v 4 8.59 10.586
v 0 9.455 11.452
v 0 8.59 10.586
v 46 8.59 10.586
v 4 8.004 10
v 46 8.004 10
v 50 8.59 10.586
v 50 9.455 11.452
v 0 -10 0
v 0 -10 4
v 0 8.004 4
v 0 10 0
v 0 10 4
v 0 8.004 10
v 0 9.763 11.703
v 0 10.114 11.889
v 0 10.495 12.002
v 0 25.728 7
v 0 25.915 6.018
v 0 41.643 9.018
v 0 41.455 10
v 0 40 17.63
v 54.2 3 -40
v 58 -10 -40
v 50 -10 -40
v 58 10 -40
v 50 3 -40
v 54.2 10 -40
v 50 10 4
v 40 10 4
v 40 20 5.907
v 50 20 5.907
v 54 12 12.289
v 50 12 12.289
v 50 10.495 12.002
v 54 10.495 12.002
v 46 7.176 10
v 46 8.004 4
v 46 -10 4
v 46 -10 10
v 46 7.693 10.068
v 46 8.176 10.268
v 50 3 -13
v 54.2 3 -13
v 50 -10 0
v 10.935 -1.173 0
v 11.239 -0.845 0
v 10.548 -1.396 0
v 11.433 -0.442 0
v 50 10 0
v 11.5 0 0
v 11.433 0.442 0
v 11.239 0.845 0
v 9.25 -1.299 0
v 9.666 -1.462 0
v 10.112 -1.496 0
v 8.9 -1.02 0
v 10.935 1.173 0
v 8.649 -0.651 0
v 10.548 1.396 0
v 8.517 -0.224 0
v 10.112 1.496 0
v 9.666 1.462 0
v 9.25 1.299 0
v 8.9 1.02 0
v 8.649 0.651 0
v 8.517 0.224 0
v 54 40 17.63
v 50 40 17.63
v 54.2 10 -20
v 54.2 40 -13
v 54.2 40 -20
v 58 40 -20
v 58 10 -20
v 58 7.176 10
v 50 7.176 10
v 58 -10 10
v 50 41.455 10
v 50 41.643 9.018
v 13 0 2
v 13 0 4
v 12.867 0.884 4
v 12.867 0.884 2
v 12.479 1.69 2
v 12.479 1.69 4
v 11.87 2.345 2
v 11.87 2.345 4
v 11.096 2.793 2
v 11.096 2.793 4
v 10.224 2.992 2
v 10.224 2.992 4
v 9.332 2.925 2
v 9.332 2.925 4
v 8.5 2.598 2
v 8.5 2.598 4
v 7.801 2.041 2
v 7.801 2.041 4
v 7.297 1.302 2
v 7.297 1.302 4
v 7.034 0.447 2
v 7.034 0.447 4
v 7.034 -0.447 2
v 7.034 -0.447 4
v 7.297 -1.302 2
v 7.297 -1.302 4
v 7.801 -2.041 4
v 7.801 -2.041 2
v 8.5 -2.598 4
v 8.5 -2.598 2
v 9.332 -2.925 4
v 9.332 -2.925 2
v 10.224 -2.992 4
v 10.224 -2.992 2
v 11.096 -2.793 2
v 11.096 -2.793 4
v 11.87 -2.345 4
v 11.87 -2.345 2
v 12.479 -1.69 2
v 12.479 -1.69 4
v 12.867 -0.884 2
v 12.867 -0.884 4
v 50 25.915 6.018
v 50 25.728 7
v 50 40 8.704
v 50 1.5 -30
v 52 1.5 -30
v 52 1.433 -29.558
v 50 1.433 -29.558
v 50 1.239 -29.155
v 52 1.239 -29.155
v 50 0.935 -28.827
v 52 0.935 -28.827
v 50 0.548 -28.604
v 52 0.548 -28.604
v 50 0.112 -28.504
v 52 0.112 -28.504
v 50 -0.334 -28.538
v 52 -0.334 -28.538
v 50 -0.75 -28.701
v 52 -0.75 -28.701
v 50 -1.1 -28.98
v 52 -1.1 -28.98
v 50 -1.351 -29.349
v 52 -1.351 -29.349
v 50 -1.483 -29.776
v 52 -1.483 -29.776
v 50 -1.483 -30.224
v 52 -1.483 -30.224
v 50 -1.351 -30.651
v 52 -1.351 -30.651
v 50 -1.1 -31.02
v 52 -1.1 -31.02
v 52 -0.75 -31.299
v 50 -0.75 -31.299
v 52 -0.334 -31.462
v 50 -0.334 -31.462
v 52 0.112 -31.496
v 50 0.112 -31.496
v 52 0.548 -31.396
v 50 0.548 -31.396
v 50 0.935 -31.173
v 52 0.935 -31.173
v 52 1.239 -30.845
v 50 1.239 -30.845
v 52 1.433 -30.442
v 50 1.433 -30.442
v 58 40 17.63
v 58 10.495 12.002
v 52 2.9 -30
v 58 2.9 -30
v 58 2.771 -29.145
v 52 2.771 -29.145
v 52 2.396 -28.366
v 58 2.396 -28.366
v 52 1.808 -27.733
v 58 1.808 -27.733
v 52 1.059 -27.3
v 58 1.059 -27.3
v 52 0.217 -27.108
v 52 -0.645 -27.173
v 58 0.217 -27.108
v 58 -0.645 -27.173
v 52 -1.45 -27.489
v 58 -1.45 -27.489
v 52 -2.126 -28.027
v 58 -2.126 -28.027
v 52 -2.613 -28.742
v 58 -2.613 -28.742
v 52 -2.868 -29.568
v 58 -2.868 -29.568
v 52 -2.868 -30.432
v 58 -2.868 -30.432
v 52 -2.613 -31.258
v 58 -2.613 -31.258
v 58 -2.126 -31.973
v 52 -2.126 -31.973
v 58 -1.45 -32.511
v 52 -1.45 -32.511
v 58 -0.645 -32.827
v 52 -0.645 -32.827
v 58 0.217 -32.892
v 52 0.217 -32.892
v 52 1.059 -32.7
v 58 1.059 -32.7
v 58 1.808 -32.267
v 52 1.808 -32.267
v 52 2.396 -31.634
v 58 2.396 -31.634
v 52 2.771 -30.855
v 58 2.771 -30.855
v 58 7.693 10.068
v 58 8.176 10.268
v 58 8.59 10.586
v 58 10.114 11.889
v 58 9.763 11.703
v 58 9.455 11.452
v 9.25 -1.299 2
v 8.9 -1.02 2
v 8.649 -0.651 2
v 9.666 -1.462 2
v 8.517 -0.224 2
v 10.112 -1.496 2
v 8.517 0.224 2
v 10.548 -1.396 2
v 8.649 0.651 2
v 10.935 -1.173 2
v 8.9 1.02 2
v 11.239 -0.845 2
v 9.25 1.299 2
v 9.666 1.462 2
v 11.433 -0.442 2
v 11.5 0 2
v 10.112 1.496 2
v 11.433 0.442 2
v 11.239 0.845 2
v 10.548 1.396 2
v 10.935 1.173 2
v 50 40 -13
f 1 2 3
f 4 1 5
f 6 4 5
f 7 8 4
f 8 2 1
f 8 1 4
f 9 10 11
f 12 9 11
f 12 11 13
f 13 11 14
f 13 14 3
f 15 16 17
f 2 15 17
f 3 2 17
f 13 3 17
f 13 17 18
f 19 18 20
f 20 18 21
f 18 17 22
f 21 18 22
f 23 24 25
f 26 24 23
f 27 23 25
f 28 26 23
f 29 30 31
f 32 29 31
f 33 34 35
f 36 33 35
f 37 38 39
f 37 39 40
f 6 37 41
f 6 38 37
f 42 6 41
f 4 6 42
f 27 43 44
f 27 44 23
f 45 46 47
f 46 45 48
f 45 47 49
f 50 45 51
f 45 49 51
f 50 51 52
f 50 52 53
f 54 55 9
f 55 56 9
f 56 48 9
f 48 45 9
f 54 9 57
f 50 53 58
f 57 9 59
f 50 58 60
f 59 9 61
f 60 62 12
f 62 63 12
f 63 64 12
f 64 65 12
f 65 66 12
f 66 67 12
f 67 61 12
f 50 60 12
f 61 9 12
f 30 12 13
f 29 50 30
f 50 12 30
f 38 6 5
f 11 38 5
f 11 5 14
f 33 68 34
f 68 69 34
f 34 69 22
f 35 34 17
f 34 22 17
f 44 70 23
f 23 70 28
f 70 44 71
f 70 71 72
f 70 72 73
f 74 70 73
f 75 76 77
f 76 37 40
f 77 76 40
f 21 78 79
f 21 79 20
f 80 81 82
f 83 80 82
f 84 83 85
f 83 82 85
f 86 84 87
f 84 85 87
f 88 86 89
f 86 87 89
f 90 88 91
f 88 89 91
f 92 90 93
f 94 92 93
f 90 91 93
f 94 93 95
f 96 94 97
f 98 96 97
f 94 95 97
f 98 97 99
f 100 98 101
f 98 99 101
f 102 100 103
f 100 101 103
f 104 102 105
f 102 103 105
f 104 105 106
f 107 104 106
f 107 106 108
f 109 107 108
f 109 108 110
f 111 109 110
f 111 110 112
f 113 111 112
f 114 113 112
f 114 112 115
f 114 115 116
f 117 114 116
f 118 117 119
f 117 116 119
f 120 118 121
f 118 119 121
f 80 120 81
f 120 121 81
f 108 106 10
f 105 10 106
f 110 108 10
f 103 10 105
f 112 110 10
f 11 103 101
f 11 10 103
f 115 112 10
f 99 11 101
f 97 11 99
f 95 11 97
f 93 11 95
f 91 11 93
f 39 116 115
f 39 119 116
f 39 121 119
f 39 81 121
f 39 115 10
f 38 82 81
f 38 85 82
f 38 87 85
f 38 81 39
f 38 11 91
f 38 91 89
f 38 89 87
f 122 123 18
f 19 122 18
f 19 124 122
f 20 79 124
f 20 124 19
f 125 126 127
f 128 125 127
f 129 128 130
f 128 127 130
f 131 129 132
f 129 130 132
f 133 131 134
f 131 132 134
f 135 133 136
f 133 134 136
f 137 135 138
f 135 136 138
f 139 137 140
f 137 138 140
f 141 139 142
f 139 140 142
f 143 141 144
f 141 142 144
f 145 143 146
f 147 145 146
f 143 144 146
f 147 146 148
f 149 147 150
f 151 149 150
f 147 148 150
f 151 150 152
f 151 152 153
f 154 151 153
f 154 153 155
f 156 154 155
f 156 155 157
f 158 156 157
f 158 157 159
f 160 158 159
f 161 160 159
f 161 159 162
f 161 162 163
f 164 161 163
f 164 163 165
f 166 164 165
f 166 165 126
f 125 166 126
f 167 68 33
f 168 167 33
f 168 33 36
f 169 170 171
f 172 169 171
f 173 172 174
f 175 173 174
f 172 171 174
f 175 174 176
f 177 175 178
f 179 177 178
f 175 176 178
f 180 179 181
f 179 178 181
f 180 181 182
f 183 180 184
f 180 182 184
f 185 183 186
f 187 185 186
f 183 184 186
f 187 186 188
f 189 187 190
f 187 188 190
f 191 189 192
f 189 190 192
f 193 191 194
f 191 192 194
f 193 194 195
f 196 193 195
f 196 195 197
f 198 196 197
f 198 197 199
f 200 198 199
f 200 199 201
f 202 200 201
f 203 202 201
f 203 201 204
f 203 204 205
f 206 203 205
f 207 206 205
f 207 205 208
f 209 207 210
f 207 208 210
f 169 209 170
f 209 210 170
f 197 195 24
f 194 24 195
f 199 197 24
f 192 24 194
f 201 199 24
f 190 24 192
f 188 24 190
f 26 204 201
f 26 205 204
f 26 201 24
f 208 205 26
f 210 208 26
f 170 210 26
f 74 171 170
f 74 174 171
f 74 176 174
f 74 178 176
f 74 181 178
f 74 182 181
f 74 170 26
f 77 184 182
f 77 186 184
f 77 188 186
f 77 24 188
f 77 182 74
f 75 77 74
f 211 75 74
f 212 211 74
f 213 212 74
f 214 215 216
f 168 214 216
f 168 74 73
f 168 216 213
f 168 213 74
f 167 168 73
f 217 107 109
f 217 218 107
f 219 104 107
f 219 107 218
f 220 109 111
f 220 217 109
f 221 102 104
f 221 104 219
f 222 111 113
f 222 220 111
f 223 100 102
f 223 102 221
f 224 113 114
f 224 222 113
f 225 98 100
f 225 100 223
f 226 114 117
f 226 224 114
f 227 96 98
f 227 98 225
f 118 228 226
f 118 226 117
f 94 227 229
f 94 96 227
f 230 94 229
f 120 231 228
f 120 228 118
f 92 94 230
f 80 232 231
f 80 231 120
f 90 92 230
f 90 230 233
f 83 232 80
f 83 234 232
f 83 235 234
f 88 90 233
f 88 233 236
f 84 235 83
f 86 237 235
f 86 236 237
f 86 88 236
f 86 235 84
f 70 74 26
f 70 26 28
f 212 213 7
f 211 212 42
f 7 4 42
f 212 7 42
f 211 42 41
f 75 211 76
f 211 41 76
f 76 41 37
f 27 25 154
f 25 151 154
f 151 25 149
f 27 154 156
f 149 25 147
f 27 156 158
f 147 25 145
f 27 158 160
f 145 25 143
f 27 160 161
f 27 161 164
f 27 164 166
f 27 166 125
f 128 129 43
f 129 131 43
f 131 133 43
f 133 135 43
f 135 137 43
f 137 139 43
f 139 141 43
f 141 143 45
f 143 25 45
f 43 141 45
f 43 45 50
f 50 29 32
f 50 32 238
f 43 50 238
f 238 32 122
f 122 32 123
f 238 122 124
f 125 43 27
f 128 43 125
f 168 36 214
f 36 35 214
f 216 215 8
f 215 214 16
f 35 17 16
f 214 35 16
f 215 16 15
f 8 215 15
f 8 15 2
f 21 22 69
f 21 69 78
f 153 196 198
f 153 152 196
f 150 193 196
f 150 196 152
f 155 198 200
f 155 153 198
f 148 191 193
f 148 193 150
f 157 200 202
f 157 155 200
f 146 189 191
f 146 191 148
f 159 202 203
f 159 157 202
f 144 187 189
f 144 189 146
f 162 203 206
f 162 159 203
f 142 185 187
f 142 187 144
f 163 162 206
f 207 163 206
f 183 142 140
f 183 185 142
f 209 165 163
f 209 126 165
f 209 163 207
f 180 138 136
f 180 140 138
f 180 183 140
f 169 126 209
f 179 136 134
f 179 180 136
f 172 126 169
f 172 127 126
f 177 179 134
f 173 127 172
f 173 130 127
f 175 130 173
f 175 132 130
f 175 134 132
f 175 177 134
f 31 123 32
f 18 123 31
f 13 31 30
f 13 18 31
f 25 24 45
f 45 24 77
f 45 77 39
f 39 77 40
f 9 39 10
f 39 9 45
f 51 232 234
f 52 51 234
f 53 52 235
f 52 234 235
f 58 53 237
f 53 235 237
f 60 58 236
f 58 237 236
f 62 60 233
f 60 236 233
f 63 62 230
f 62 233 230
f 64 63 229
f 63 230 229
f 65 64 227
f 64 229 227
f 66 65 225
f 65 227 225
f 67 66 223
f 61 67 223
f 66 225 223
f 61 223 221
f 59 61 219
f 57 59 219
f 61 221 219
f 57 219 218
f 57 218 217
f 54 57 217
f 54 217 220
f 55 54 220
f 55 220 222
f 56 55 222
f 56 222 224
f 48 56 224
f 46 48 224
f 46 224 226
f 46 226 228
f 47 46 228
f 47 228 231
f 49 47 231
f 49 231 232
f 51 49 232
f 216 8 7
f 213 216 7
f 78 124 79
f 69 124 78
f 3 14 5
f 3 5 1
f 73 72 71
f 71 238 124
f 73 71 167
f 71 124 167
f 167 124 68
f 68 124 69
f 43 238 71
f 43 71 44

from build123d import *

# Parameters (mm, degrees)
EXTRUDE_1_DEPTH      = 50
SKETCH_2_W           = 50
SKETCH_2_H           = 10
EXTRUDE_2_DEPTH      = 10
SKETCH_3_W           = 10
SKETCH_3_H           = 20
EXTRUDE_3_DEPTH      = 20
SKETCH_4_W           = 20
SKETCH_4_H           = 10
EXTRUDE_4_DEPTH      = 30
CUT_EXTRUDE_1_DEPTH  = 50
CHAMFER_1_SIZE       = 2
SKETCH_9_R           = 1.5
CUT_EXTRUDE_2_DEPTH  = 66.715656955
CUT_EXTRUDE_4_DEPTH  = 6
SKETCH_13_W          = 4
SKETCH_13_H          = 6
EXTRUDE_12_DEPTH     = 18.003980276
FILLET_2_R           = 2
SKETCH_15_W          = 20
SKETCH_15_H          = 50
SKETCH_15_R          = 1.5
EXTRUDE_14_DEPTH     = 4
CUT_EXTRUDE_5_DEPTH  = 4
SKETCH_17_W          = 16
SKETCH_17_H          = 50
CUT_EXTRUDE_6_DEPTH  = 4
EXTRUDE_15_DEPTH     = 10
SKETCH_20_W          = 4
SKETCH_20_H          = 50
EXTRUDE_16_DEPTH     = 20
SKETCH_23_W          = 24
SKETCH_23_H          = 22
CUT_EXTRUDE_9_DEPTH  = 4
EXTRUDE_17_REACH     = 74.184
SKETCH_25_W          = 4
SKETCH_25_H          = 12.288957455
EXTRUDE_18_DEPTH     = 22
CUT_EXTRUDE_10_DEPTH = 4
CUT_EXTRUDE_START    = -4
CUT_EXTRUDE_11_DEPTH = 4
CUT_EXTRUDE_14_DEPTH = 10
EXTRUDE_19_DEPTH     = 4
SKETCH_35_W          = 8
SKETCH_35_H          = 20
EXTRUDE_20_DEPTH     = 22
SKETCH_36_W          = 8
SKETCH_36_H          = 20
EXTRUDE_21_DEPTH     = 20
CUT_EXTRUDE_17_DEPTH = 4.2
SKETCH_38_R          = 1.5
CUT_EXTRUDE_18_DEPTH = 10
SKETCH_39_R          = 2.9
CUT_EXTRUDE_19_DEPTH = 6
SKETCH_40_R          = 3
CUT_EXTRUDE_20_DEPTH = 2
SKETCH_41_W          = 50
SKETCH_41_H          = 16.011247617
EXTRUDE_22_DEPTH     = 1


with BuildPart() as part:
    # 草图1 → 凸台-拉伸1 (new body)
    with BuildSketch(Plane(origin=(0, 0, 0), x_dir=(0, 0, -1), z_dir=(1, 0, 0))):
        Polygon((0, 0), (-10, 0), (-17.629858184, 40), (-10, 41.455368398), (-4, 10), (0, 10), align=None)
    extrude(amount=EXTRUDE_1_DEPTH)

    # 草图2 → 凸台-拉伸2 (add)
    with BuildSketch(Plane.XZ):
        with Locations((25, 5)):
            Rectangle(SKETCH_2_W, SKETCH_2_H)
    extrude(amount=EXTRUDE_2_DEPTH)

    # 草图3 → 凸台-拉伸3 (add)
    with BuildSketch(Plane.ZY):
        with Locations((5, 0)):
            Rectangle(SKETCH_3_W, SKETCH_3_H)
    extrude(amount=EXTRUDE_3_DEPTH)

    # 草图4 → 凸台-拉伸4 (add)
    with BuildSketch(Plane(origin=(0, 10, 0), x_dir=(1, 0, 0), z_dir=(0, 1, 0))):
        with Locations((-10, -5)):
            Rectangle(SKETCH_4_W, SKETCH_4_H)
    extrude(amount=EXTRUDE_4_DEPTH)

    # 草图5 → 切除-拉伸1 (cut)
    with BuildSketch(Plane(origin=(50, 0, 0), x_dir=(0, 0, -1), z_dir=(1, 0, 0))):
        Polygon((-10, 10.003980276), (-11.908223769, 10.003980276), (-10, 0), align=None)
    extrude(amount=-CUT_EXTRUDE_1_DEPTH, mode=Mode.SUBTRACT)

    # 倒角1
    # the kernel refuses this chamfer: 2 mm, written as the material it adds along each edge
    with BuildSketch(Plane(origin=(50, 10.003980276, 10), x_dir=(0, 0.027495876610586487, 0.9996219169112968), z_dir=(-1, 0, 0))) as chamfer_1_piece_1_section:
        Polygon((CHAMFER_1_SIZE * 0.999621916911, -CHAMFER_1_SIZE * 0.0274958766106), (-CHAMFER_1_SIZE * 0.0274958766106, -CHAMFER_1_SIZE * 0.999621916911), (0, 0), align=None)
    chamfer_1_piece_1 = extrude(amount=50, mode=Mode.PRIVATE)
    chamfer_1_piece_1 = split(chamfer_1_piece_1, bisect_by=Plane(origin=(25, 9.131023425, 11.741710345), z_dir=(0, 0.18736828457892524, -0.9822897362458548)), keep=Keep.TOP, mode=Mode.PRIVATE)
    add(chamfer_1_piece_1)

    # 草图9 → 切除-拉伸2 (cut, through all)
    with BuildSketch(Plane.XY.offset(10)):
        with Locations((-10, 20)):
            Circle(SKETCH_9_R)
        with Locations((10, 0)):
            Circle(SKETCH_9_R)
    extrude(amount=-CUT_EXTRUDE_2_DEPTH, mode=Mode.SUBTRACT)

    # 草图12 → 切除-拉伸4 (cut)
    with BuildSketch(Plane.XY.offset(10)):
        Polygon((50, -10), (50, 8.003980276), (0, 8.003980276), (0, 40), (-20, 40), (-20, -10), align=None)
    extrude(amount=-CUT_EXTRUDE_4_DEPTH, mode=Mode.SUBTRACT)

    # 草图13 → 凸台-拉伸12 (add)
    with BuildSketch(Plane.XZ.offset(-8.003980276)):
        with Locations((2, 7)):
            Rectangle(SKETCH_13_W, SKETCH_13_H)
        with Locations((48, 7)):
            Rectangle(SKETCH_13_W, SKETCH_13_H)
    extrude(amount=EXTRUDE_12_DEPTH)

    # 圆角2
    fillet_2_edges = [part.edges().sort_by_distance(p)[0] for p in [
        (2, 8.003980276, 10),
        (48, 8.003980276, 10),
        (25, 9.890571776, 11.8865915),
    ]]
    fillet(fillet_2_edges, radius=FILLET_2_R)

    # 草图15 → 凸台-拉伸14 (add)
    with BuildSketch(Plane(origin=(0, 0, 0), x_dir=(-1, 0, 0), z_dir=(0, 0, -1))):
        with Locations((-60, 15)):
            Rectangle(SKETCH_15_W, SKETCH_15_H)
        with Locations(Location((-60, 20, 0), (0, 0, 180))):
            Circle(SKETCH_15_R, mode=Mode.SUBTRACT)
    extrude(amount=-EXTRUDE_14_DEPTH)

    # 草图16 → 切除-拉伸5 (cut)
    with BuildSketch(Plane.XY.offset(4)):
        Polygon((-20, -10), (0, -10), (0, 10), (0, 40), (-20, 40), align=None)
    extrude(amount=-CUT_EXTRUDE_5_DEPTH, mode=Mode.SUBTRACT)

    # 草图17 → 切除-拉伸6 (cut)
    with BuildSketch(Plane.XY.offset(4)):
        with Locations((62, 15)):
            Rectangle(SKETCH_17_W, SKETCH_17_H)
    extrude(amount=-CUT_EXTRUDE_6_DEPTH, mode=Mode.SUBTRACT)

    # 草图18 → 凸台-拉伸15 (add)
    with BuildSketch(Plane.ZY.offset(-50)):
        Polygon((0, 10), (4, 10), (5.907464546, 20), (0, 20), align=None)
    extrude(amount=EXTRUDE_15_DEPTH)

    # 草图20 → 凸台-拉伸16 (add)
    with BuildSketch(Plane(origin=(0, 0, 0), x_dir=(-1, 0, 0), z_dir=(0, 0, -1))):
        with Locations((-52, 15)):
            Rectangle(SKETCH_20_W, SKETCH_20_H)
    extrude(amount=EXTRUDE_16_DEPTH)

    # 草图23 → 切除-拉伸9 (cut)
    with BuildSketch(Plane(origin=(54, 0, 0), x_dir=(0, 0, -1), z_dir=(1, 0, 0))):
        with Locations((8, 1)):
            Rectangle(SKETCH_23_W, SKETCH_23_H)
    extrude(amount=-CUT_EXTRUDE_9_DEPTH, mode=Mode.SUBTRACT)

    # 凸台-拉伸17: up to this plane
    extrude_17_end = Plane(origin=(50, 0, 10), z_dir=(0, 0.18736828457892524, -0.9822897362458548))
    # 草图24 → 凸台-拉伸17 (add, up to the surface)
    with BuildSketch(Plane.XY.offset(4), mode=Mode.PRIVATE) as extrude_17_sk1:
        Polygon((50, 12), (54, 12), (54, 40), (50, 40), (50, 20), align=None)
    extrude_17_tool1 = split(extrude(extrude_17_sk1.sketch, amount=EXTRUDE_17_REACH, mode=Mode.PRIVATE), bisect_by=extrude_17_end, keep=Keep.BOTH, mode=Mode.PRIVATE)
    add(extrude_17_tool1.solids().sort_by_distance((52, 26, 4))[0])

    # 草图25 → 凸台-拉伸18 (add)
    with BuildSketch(Plane.XZ.offset(-12)):
        with Locations((52, 6.144478728)):
            Rectangle(SKETCH_25_W, SKETCH_25_H)
    extrude(amount=EXTRUDE_18_DEPTH)

    # 草图26 → 切除-拉伸10 (cut)
    with BuildSketch(Plane.ZY.offset(-50)):
        with BuildLine():
            Line((12.288957455, -10), (12.288957455, 12))
            Line((12.288957455, 12), (12.001878243, 10.494969601))
            ThreePointArc((12.001878243, 10.494969601), (11.804836237, 9.933858265), (11.451512332, 9.455492608))
            Line((11.451512332, 9.455492608), (10.585786438, 8.589766713))
            ThreePointArc((10.585786438, 8.589766713), (10.152240935, 7.940920016), (10, 7.175553151))
            Line((10, 7.175553151), (10, -10))
            Line((10, -10), (12.288957455, -10))
        make_face()
    extrude(amount=-CUT_EXTRUDE_10_DEPTH, mode=Mode.SUBTRACT)

    # 草图27 → 切除-拉伸11 (cut)
    with BuildSketch(Plane(origin=(4, 0, 0), x_dir=(0, 0, -1), z_dir=(1, 0, 0)).offset(CUT_EXTRUDE_START)):
        with BuildLine():
            Line((-10, -10), (-4, -10))
            Line((-4, -10), (-4, 8.003980276))
            Line((-4, 8.003980276), (-10, 8.003980276))
            Line((-10, 8.003980276), (-10.585786438, 8.589766713))
            ThreePointArc((-10.585786438, 8.589766713), (-10.152240935, 7.940920016), (-10, 7.175553151))
            Line((-10, 7.175553151), (-10, -10))
        make_face()
    extrude(amount=CUT_EXTRUDE_11_DEPTH, mode=Mode.SUBTRACT)

    # 草图31 → 切除-拉伸14 (cut)
    with BuildSketch(Plane.ZY.offset(-40)):
        Polygon((0, 20), (0, 10), (4, 10), (5.907464546, 20), align=None)
    extrude(amount=-CUT_EXTRUDE_14_DEPTH, mode=Mode.SUBTRACT)

    # 草图32 → 凸台-拉伸19 (add)
    with BuildSketch(Plane(origin=(54, 0, 0), x_dir=(0, 0, -1), z_dir=(1, 0, 0))):
        with BuildLine():
            Line((-10, 7.175553151), (-10, -10))
            Line((-10, -10), (0, -10))
            Line((0, -10), (0, 12))
            Line((0, 12), (20, 12))
            Line((20, 12), (20, 40))
            Line((20, 40), (-17.629858184, 40))
            Line((-17.629858184, 40), (-12.001878243, 10.494969601))
            ThreePointArc((-12.001878243, 10.494969601), (-11.804836237, 9.933858265), (-11.451512332, 9.455492608))
            Line((-11.451512332, 9.455492608), (-10.585786438, 8.589766713))
            ThreePointArc((-10.585786438, 8.589766713), (-10.152240935, 7.940920016), (-10, 7.175553151))
        make_face()
    extrude(amount=EXTRUDE_19_DEPTH)

    # 草图35 → 凸台-拉伸20 (add)
    with BuildSketch(Plane.XZ.offset(-12)):
        with Locations((54, -10)):
            Rectangle(SKETCH_35_W, SKETCH_35_H)
    extrude(amount=EXTRUDE_20_DEPTH)

    # 草图36 → 凸台-拉伸21 (add)
    with BuildSketch(Plane(origin=(0, 0, -20), x_dir=(-1, 0, 0), z_dir=(0, 0, -1))):
        with Locations((-54, 0)):
            Rectangle(SKETCH_36_W, SKETCH_36_H)
    extrude(amount=EXTRUDE_21_DEPTH)

    # 草图37 → 切除-拉伸17 (cut)
    with BuildSketch(Plane.ZY.offset(-50)):
        Polygon((-20, 40), (-13, 40), (-13, 3), (-40, 3), (-40, 10), (-20, 10), align=None)
    extrude(amount=-CUT_EXTRUDE_17_DEPTH, mode=Mode.SUBTRACT)

    # 草图38 → 切除-拉伸18 (cut)
    with BuildSketch(Plane(origin=(58, 0, 0), x_dir=(0, 0, -1), z_dir=(1, 0, 0))):
        with Locations(Location((30, 0, 0), (0, 0, 90))):
            Circle(SKETCH_38_R)
    extrude(amount=-CUT_EXTRUDE_18_DEPTH, mode=Mode.SUBTRACT)

    # 草图39 → 切除-拉伸19 (cut)
    with BuildSketch(Plane(origin=(58, 0, 0), x_dir=(0, 0, -1), z_dir=(1, 0, 0))):
        with Locations(Location((30, 0, 0), (0, 0, 90))):
            Circle(SKETCH_39_R)
    extrude(amount=-CUT_EXTRUDE_19_DEPTH, mode=Mode.SUBTRACT)

    # 草图40 → 切除-拉伸20 (cut)
    with BuildSketch(Plane.XY.offset(4)):
        with Locations((10, 0)):
            Circle(SKETCH_40_R)
    extrude(amount=-CUT_EXTRUDE_20_DEPTH, mode=Mode.SUBTRACT)

    # 草图41 → 凸台-拉伸22 (add)
    with BuildSketch(Plane(origin=(0, -0.385131031, 2.019073075), x_dir=(-1, 0, 0), z_dir=(0, 0.18736828457892515, -0.9822897362458548))):
        with Locations((-25, 34.589241927)):
            Rectangle(SKETCH_41_W, SKETCH_41_H)
    extrude(amount=EXTRUDE_22_DEPTH)


solid = part.part
